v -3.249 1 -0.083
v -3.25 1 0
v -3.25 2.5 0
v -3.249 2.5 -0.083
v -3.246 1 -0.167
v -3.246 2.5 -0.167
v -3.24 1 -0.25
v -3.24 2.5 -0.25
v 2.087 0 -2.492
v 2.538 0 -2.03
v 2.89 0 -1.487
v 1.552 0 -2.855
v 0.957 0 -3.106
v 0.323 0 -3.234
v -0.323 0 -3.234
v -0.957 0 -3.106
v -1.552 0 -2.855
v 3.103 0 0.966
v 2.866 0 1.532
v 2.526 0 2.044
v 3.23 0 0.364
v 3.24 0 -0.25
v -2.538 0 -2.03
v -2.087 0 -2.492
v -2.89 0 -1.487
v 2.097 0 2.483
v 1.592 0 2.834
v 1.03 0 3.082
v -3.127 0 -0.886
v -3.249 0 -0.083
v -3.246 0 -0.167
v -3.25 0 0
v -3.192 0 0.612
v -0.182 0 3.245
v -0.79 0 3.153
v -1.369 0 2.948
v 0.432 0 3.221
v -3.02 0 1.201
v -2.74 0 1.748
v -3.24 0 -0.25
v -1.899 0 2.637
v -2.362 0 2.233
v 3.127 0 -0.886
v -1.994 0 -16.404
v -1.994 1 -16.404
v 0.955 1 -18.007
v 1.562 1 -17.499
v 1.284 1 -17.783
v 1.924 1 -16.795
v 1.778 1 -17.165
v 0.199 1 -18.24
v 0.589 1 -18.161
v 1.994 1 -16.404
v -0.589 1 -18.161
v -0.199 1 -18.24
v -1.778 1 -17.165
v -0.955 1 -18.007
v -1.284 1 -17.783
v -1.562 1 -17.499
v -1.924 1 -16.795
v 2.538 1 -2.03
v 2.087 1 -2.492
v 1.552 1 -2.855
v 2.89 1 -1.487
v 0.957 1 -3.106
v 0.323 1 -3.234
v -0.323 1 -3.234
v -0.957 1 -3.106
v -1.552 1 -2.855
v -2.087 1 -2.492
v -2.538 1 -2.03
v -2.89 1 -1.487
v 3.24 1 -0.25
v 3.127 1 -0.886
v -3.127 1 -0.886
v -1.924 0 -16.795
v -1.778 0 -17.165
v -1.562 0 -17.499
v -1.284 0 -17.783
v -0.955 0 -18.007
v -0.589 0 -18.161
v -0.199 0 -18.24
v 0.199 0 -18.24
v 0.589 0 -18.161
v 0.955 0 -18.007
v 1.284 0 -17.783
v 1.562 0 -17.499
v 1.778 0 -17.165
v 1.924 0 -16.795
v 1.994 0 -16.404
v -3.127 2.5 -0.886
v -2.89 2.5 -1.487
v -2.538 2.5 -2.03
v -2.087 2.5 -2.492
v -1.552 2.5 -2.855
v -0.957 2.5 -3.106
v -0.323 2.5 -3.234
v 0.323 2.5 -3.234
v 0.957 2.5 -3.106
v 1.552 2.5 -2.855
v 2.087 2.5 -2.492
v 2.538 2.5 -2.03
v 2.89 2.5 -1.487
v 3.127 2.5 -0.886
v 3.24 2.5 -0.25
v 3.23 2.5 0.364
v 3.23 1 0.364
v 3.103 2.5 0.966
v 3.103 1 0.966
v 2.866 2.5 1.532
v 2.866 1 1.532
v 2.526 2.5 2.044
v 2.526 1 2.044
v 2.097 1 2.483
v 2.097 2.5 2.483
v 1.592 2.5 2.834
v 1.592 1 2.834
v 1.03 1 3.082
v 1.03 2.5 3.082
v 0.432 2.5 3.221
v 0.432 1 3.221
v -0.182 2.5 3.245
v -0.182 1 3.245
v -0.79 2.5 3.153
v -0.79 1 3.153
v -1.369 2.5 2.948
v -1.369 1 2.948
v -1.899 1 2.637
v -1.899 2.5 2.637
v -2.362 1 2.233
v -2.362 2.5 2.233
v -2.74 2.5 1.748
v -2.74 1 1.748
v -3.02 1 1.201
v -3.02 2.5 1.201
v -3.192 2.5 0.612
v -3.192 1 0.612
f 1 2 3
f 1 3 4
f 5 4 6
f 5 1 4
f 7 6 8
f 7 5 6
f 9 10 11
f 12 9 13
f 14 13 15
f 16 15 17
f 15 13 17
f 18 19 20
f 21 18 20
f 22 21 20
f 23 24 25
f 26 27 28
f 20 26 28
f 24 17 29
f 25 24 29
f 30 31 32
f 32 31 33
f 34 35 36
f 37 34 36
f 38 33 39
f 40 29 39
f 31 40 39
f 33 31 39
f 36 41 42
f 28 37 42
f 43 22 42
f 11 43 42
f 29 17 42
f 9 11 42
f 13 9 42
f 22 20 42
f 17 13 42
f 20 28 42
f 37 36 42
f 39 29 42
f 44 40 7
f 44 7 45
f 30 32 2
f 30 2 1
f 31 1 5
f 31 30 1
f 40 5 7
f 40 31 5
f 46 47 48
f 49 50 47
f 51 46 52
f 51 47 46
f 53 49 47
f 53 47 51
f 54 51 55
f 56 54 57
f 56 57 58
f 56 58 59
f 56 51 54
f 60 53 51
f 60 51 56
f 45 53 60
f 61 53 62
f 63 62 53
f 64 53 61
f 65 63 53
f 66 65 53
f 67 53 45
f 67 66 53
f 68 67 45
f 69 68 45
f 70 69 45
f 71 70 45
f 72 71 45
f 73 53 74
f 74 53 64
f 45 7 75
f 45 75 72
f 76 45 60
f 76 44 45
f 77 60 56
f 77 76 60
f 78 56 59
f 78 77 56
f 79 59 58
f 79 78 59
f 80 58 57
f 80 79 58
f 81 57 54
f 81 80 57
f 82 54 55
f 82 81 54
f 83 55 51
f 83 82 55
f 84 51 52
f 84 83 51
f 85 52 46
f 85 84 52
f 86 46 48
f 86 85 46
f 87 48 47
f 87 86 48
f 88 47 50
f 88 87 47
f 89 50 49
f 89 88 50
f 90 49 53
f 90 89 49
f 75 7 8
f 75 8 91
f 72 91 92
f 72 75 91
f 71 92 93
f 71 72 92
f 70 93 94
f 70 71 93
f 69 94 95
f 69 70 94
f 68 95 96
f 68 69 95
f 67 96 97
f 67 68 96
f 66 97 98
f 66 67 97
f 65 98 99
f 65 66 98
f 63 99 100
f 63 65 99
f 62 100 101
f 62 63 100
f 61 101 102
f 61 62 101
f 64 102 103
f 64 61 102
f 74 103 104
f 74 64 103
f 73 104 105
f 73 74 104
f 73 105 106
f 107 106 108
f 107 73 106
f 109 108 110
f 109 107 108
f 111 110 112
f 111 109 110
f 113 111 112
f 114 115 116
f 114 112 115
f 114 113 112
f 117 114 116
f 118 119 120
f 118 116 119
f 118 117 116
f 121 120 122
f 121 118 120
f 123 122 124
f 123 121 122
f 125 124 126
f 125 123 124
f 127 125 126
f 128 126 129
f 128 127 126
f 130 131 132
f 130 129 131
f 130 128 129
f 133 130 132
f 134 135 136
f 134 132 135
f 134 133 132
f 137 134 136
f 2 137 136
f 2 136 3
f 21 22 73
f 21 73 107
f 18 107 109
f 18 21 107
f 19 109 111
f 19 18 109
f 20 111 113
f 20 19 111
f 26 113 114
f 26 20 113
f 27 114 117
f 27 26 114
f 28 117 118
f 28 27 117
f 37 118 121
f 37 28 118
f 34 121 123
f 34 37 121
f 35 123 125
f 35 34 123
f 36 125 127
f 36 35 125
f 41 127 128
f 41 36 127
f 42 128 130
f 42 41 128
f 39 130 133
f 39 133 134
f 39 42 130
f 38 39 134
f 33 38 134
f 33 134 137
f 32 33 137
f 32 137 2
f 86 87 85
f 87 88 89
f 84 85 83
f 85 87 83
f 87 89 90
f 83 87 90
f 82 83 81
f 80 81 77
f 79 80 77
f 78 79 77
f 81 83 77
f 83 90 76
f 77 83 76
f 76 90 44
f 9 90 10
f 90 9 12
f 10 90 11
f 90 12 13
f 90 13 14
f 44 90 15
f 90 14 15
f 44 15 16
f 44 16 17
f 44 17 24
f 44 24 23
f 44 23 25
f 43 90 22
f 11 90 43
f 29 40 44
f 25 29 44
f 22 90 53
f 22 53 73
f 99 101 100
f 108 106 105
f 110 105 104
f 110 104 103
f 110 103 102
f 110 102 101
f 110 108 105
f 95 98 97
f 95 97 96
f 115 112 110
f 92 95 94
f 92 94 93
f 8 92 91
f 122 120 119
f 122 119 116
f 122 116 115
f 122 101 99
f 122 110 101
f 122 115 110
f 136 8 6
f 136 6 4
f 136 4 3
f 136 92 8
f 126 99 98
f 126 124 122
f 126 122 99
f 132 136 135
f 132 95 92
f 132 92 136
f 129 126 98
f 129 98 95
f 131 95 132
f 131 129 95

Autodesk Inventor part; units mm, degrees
ref_plane "YZ Plane" through (0, 0, 0) normal (1, 0, 0) x (0, 1, 0)
ref_plane "XZ Plane" through (0, 0, 0) normal (0, 1, 0) x (-1, 0, 0)
ref_plane "XY Plane" through (0, 0, 0) normal (0, 0, 1) x (1, 0, 0)
sketch "Sketch1" plane through (0, 0, 0) normal (0, 1, 0) x (-1, 0, 0)
  circle A0 centre (0, 0) radius 3.25
  circle A1 centre (0, -16.25) radius 2
  line L0 (3.2404, -0.25) -> (1.9941, -16.4038)
  line L1 (-1.9941, -16.4038) -> (-3.2404, -0.25)
  dimension "d0" = 6.5
  dimension "d1" = 4
  dimension "d2" = 21.5
extrude "Extrusion1" add sketch "Sketch1" along normal blind 1
extrude "Extrusion2" add sketch "Sketch1" along normal blind 2.5 contours A0
properties part number "Servo attachment"
